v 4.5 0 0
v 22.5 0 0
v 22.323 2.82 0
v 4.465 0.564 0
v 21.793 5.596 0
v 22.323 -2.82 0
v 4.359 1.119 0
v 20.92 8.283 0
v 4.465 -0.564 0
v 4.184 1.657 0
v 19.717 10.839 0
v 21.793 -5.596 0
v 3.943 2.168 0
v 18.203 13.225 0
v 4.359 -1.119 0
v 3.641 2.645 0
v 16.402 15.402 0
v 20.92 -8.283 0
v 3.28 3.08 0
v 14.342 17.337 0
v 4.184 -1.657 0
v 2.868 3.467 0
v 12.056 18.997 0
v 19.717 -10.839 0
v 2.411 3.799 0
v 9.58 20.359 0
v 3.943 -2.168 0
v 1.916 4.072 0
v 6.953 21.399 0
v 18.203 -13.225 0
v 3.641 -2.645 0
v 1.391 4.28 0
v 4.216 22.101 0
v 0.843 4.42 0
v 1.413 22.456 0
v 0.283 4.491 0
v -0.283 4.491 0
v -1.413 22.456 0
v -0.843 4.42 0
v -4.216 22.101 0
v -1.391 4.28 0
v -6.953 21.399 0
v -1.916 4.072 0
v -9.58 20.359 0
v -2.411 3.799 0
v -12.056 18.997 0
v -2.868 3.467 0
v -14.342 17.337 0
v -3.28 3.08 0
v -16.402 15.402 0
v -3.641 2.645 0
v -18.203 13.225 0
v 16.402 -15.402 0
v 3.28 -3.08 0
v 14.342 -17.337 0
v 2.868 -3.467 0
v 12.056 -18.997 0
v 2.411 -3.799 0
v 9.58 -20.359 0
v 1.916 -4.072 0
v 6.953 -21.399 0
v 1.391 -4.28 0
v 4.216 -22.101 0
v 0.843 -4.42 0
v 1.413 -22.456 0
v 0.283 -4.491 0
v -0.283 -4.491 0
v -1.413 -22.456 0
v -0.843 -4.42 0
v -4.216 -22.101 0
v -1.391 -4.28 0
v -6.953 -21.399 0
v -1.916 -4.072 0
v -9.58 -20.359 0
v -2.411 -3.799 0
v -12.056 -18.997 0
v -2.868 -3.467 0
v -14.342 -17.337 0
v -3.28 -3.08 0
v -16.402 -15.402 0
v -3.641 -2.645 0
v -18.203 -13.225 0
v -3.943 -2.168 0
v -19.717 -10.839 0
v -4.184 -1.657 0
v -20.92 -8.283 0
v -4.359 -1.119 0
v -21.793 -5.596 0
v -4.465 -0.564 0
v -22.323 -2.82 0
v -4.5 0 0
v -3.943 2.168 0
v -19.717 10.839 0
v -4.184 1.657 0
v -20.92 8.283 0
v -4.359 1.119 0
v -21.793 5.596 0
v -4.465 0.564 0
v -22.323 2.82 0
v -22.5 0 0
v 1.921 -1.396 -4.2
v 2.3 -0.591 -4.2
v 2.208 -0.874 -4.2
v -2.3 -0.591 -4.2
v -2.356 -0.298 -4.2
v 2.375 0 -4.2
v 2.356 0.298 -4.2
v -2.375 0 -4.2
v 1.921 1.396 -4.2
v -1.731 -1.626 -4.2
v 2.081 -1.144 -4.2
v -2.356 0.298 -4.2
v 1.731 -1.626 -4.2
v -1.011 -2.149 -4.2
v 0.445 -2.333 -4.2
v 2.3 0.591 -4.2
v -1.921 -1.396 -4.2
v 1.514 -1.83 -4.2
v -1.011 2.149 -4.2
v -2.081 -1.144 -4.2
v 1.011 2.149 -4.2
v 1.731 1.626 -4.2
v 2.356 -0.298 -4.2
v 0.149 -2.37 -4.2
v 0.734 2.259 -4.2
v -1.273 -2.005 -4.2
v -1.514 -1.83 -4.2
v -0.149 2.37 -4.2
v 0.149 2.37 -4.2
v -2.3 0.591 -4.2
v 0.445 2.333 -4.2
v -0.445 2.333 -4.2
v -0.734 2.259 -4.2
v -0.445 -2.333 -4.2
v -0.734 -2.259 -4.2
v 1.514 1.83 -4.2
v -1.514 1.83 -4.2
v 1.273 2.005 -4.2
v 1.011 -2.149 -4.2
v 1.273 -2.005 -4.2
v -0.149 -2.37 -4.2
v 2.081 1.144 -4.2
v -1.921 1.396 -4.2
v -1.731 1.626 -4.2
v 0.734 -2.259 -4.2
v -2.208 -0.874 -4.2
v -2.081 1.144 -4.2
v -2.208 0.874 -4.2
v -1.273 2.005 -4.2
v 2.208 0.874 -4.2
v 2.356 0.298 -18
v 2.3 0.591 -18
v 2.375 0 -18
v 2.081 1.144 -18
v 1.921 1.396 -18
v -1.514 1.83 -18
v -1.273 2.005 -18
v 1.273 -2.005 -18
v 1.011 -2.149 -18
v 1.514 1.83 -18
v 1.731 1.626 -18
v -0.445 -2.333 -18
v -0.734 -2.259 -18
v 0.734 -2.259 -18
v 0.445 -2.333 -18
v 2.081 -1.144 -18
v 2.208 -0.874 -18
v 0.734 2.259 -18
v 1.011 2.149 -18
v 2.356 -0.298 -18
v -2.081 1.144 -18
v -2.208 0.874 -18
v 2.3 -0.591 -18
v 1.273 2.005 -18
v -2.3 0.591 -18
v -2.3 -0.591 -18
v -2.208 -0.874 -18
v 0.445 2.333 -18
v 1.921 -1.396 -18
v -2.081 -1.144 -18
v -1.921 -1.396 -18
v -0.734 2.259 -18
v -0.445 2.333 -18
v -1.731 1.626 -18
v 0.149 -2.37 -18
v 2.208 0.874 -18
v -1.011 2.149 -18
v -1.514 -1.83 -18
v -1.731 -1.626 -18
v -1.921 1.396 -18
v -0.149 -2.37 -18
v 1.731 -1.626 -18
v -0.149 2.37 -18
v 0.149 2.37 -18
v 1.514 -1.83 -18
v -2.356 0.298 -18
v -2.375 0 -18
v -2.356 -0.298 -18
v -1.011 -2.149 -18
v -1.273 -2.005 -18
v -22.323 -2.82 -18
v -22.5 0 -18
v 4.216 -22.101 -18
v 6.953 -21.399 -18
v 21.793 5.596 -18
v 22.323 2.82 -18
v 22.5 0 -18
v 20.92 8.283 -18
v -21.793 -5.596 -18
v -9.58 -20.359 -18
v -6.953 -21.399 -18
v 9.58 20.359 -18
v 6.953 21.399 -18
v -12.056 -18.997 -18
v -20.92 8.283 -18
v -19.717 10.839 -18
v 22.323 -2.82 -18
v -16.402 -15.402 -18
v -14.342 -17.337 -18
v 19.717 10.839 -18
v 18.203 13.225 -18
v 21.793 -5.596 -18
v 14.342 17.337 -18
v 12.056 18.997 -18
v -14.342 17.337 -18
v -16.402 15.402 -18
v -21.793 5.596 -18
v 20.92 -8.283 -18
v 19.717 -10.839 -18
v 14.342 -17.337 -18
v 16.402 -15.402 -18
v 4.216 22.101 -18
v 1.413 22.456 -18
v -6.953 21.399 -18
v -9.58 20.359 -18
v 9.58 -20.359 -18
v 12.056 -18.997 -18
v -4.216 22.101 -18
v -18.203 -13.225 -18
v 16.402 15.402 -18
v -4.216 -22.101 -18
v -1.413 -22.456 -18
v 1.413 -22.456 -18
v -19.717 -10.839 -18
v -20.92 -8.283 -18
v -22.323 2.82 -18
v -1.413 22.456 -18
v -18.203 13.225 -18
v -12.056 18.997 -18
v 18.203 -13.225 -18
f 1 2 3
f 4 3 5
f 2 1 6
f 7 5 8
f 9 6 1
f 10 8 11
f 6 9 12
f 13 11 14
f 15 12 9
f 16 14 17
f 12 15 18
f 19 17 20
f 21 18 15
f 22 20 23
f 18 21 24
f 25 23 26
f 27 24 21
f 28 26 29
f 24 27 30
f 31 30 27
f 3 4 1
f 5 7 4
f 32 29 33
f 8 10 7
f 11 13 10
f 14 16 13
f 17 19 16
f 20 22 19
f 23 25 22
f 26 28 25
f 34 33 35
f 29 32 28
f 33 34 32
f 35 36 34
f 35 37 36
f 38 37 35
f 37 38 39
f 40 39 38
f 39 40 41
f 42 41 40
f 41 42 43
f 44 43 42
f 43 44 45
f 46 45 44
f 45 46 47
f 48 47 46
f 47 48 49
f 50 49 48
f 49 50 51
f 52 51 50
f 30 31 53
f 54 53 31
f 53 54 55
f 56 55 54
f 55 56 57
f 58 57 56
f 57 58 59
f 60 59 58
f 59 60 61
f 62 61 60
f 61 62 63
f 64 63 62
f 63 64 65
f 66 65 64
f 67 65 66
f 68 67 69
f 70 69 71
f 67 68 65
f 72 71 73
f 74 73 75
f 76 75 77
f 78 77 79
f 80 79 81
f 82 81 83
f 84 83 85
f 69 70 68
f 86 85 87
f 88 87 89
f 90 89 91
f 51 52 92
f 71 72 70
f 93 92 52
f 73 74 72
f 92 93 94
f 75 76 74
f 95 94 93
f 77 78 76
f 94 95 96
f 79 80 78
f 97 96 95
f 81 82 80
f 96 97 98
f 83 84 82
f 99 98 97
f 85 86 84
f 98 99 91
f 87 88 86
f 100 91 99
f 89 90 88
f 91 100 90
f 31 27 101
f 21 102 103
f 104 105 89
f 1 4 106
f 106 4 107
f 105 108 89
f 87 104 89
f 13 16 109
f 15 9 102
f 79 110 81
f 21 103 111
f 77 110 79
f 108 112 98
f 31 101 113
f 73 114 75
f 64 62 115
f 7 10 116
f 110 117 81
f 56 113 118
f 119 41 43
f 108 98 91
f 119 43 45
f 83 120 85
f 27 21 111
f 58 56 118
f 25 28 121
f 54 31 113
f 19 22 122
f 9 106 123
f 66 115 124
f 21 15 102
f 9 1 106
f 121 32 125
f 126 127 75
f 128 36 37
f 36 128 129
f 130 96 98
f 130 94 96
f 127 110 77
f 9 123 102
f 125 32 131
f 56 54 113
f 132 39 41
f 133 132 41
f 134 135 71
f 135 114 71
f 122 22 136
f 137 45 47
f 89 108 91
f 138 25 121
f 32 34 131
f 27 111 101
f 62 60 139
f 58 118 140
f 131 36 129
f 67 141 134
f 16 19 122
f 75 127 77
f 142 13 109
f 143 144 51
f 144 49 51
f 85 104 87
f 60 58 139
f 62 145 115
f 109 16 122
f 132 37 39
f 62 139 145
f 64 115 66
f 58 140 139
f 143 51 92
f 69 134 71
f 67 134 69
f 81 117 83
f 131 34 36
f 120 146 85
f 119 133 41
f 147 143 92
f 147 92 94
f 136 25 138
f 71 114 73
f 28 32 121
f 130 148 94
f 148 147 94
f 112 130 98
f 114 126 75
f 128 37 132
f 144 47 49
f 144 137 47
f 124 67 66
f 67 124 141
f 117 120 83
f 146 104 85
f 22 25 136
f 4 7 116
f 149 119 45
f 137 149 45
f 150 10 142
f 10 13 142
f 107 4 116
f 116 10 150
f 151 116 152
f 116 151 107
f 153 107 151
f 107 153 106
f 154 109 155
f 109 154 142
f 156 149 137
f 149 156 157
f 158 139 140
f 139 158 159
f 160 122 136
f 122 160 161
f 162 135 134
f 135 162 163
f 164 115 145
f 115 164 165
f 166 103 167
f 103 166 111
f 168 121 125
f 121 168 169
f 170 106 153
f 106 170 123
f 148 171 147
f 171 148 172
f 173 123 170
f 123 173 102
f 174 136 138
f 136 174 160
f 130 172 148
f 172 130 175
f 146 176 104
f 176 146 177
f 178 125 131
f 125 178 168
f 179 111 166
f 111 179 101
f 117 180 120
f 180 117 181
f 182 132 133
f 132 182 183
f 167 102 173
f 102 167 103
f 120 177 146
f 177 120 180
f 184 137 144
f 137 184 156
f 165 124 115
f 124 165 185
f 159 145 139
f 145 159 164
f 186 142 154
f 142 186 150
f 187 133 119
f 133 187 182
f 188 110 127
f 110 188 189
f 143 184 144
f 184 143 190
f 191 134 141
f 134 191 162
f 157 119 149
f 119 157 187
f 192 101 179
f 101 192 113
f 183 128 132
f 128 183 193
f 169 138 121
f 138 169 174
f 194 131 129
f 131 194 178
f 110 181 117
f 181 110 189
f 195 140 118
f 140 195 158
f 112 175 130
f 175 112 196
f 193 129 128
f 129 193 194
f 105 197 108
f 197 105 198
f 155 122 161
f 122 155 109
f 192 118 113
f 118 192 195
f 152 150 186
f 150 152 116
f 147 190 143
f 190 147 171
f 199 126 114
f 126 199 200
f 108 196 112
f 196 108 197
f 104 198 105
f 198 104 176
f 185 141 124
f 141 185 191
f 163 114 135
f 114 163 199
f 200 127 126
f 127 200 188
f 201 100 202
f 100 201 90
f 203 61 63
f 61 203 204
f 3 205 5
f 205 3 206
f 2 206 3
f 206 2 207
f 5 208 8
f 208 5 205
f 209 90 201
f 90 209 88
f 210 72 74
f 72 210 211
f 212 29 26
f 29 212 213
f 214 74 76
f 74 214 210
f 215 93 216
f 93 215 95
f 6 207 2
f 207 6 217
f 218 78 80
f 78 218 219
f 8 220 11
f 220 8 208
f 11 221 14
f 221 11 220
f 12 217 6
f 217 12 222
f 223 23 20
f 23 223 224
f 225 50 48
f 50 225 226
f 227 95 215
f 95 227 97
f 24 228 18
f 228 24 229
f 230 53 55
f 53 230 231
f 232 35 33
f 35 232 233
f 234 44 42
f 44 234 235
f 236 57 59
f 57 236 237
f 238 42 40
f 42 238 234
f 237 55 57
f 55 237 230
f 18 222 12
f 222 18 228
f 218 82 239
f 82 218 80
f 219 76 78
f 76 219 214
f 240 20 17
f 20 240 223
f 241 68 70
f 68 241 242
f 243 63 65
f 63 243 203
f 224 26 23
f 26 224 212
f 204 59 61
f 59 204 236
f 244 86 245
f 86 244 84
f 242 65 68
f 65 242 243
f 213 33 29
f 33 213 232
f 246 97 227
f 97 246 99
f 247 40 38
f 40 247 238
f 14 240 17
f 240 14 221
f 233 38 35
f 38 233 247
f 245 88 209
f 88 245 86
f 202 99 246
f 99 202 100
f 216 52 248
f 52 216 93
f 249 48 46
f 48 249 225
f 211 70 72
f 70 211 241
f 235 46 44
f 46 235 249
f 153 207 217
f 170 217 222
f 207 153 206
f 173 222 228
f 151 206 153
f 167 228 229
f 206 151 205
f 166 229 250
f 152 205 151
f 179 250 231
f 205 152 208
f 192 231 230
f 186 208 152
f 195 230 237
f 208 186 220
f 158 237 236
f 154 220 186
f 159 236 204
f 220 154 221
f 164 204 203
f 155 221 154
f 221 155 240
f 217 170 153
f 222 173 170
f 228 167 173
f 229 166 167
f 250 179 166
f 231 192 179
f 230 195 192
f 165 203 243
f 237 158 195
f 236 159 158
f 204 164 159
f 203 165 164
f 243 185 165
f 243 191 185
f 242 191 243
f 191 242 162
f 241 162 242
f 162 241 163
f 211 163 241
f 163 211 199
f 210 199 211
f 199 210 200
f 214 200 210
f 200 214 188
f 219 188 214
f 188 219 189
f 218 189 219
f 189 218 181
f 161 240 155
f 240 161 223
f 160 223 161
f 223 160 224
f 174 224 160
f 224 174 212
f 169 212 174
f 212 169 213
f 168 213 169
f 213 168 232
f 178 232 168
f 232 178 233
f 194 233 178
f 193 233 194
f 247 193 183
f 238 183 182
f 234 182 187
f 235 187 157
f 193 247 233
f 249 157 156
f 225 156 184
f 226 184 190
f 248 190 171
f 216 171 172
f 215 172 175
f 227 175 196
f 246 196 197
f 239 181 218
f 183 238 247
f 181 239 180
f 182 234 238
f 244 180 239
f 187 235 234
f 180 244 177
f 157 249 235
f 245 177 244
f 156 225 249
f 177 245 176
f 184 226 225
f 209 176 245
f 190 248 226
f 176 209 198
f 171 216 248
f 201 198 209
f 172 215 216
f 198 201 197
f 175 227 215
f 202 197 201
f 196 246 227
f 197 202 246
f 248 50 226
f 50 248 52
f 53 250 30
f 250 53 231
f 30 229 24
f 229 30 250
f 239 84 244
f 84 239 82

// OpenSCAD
$fn = 50;

difference() {
	union() {
		translate(v = [0, 0, -18.0]) {
			cylinder(h = 18, r = 22.5);
		}
	}
	union() {
		translate(v = [0, 0, 0]) {
			rotate(a = [0, 0, 0]) {
				difference() {
					union() {
						translate(v = [0, 0, -21.0]) {
							cylinder(h = 21, r = 2.25);
						}
						translate(v = [0, 0, -4.2]) {
							cylinder(h = 4.2, r1 = 2.375, r2 = 4.5);
						}
						translate(v = [0, 0, -21.0]) {
							cylinder(h = 21, r = 2.375);
						}
						translate(v = [0, 0, -21.0]) {
							cylinder(h = 21, r = 2.25);
						}
					}
					union();
				}
			}
		}
	}
}
